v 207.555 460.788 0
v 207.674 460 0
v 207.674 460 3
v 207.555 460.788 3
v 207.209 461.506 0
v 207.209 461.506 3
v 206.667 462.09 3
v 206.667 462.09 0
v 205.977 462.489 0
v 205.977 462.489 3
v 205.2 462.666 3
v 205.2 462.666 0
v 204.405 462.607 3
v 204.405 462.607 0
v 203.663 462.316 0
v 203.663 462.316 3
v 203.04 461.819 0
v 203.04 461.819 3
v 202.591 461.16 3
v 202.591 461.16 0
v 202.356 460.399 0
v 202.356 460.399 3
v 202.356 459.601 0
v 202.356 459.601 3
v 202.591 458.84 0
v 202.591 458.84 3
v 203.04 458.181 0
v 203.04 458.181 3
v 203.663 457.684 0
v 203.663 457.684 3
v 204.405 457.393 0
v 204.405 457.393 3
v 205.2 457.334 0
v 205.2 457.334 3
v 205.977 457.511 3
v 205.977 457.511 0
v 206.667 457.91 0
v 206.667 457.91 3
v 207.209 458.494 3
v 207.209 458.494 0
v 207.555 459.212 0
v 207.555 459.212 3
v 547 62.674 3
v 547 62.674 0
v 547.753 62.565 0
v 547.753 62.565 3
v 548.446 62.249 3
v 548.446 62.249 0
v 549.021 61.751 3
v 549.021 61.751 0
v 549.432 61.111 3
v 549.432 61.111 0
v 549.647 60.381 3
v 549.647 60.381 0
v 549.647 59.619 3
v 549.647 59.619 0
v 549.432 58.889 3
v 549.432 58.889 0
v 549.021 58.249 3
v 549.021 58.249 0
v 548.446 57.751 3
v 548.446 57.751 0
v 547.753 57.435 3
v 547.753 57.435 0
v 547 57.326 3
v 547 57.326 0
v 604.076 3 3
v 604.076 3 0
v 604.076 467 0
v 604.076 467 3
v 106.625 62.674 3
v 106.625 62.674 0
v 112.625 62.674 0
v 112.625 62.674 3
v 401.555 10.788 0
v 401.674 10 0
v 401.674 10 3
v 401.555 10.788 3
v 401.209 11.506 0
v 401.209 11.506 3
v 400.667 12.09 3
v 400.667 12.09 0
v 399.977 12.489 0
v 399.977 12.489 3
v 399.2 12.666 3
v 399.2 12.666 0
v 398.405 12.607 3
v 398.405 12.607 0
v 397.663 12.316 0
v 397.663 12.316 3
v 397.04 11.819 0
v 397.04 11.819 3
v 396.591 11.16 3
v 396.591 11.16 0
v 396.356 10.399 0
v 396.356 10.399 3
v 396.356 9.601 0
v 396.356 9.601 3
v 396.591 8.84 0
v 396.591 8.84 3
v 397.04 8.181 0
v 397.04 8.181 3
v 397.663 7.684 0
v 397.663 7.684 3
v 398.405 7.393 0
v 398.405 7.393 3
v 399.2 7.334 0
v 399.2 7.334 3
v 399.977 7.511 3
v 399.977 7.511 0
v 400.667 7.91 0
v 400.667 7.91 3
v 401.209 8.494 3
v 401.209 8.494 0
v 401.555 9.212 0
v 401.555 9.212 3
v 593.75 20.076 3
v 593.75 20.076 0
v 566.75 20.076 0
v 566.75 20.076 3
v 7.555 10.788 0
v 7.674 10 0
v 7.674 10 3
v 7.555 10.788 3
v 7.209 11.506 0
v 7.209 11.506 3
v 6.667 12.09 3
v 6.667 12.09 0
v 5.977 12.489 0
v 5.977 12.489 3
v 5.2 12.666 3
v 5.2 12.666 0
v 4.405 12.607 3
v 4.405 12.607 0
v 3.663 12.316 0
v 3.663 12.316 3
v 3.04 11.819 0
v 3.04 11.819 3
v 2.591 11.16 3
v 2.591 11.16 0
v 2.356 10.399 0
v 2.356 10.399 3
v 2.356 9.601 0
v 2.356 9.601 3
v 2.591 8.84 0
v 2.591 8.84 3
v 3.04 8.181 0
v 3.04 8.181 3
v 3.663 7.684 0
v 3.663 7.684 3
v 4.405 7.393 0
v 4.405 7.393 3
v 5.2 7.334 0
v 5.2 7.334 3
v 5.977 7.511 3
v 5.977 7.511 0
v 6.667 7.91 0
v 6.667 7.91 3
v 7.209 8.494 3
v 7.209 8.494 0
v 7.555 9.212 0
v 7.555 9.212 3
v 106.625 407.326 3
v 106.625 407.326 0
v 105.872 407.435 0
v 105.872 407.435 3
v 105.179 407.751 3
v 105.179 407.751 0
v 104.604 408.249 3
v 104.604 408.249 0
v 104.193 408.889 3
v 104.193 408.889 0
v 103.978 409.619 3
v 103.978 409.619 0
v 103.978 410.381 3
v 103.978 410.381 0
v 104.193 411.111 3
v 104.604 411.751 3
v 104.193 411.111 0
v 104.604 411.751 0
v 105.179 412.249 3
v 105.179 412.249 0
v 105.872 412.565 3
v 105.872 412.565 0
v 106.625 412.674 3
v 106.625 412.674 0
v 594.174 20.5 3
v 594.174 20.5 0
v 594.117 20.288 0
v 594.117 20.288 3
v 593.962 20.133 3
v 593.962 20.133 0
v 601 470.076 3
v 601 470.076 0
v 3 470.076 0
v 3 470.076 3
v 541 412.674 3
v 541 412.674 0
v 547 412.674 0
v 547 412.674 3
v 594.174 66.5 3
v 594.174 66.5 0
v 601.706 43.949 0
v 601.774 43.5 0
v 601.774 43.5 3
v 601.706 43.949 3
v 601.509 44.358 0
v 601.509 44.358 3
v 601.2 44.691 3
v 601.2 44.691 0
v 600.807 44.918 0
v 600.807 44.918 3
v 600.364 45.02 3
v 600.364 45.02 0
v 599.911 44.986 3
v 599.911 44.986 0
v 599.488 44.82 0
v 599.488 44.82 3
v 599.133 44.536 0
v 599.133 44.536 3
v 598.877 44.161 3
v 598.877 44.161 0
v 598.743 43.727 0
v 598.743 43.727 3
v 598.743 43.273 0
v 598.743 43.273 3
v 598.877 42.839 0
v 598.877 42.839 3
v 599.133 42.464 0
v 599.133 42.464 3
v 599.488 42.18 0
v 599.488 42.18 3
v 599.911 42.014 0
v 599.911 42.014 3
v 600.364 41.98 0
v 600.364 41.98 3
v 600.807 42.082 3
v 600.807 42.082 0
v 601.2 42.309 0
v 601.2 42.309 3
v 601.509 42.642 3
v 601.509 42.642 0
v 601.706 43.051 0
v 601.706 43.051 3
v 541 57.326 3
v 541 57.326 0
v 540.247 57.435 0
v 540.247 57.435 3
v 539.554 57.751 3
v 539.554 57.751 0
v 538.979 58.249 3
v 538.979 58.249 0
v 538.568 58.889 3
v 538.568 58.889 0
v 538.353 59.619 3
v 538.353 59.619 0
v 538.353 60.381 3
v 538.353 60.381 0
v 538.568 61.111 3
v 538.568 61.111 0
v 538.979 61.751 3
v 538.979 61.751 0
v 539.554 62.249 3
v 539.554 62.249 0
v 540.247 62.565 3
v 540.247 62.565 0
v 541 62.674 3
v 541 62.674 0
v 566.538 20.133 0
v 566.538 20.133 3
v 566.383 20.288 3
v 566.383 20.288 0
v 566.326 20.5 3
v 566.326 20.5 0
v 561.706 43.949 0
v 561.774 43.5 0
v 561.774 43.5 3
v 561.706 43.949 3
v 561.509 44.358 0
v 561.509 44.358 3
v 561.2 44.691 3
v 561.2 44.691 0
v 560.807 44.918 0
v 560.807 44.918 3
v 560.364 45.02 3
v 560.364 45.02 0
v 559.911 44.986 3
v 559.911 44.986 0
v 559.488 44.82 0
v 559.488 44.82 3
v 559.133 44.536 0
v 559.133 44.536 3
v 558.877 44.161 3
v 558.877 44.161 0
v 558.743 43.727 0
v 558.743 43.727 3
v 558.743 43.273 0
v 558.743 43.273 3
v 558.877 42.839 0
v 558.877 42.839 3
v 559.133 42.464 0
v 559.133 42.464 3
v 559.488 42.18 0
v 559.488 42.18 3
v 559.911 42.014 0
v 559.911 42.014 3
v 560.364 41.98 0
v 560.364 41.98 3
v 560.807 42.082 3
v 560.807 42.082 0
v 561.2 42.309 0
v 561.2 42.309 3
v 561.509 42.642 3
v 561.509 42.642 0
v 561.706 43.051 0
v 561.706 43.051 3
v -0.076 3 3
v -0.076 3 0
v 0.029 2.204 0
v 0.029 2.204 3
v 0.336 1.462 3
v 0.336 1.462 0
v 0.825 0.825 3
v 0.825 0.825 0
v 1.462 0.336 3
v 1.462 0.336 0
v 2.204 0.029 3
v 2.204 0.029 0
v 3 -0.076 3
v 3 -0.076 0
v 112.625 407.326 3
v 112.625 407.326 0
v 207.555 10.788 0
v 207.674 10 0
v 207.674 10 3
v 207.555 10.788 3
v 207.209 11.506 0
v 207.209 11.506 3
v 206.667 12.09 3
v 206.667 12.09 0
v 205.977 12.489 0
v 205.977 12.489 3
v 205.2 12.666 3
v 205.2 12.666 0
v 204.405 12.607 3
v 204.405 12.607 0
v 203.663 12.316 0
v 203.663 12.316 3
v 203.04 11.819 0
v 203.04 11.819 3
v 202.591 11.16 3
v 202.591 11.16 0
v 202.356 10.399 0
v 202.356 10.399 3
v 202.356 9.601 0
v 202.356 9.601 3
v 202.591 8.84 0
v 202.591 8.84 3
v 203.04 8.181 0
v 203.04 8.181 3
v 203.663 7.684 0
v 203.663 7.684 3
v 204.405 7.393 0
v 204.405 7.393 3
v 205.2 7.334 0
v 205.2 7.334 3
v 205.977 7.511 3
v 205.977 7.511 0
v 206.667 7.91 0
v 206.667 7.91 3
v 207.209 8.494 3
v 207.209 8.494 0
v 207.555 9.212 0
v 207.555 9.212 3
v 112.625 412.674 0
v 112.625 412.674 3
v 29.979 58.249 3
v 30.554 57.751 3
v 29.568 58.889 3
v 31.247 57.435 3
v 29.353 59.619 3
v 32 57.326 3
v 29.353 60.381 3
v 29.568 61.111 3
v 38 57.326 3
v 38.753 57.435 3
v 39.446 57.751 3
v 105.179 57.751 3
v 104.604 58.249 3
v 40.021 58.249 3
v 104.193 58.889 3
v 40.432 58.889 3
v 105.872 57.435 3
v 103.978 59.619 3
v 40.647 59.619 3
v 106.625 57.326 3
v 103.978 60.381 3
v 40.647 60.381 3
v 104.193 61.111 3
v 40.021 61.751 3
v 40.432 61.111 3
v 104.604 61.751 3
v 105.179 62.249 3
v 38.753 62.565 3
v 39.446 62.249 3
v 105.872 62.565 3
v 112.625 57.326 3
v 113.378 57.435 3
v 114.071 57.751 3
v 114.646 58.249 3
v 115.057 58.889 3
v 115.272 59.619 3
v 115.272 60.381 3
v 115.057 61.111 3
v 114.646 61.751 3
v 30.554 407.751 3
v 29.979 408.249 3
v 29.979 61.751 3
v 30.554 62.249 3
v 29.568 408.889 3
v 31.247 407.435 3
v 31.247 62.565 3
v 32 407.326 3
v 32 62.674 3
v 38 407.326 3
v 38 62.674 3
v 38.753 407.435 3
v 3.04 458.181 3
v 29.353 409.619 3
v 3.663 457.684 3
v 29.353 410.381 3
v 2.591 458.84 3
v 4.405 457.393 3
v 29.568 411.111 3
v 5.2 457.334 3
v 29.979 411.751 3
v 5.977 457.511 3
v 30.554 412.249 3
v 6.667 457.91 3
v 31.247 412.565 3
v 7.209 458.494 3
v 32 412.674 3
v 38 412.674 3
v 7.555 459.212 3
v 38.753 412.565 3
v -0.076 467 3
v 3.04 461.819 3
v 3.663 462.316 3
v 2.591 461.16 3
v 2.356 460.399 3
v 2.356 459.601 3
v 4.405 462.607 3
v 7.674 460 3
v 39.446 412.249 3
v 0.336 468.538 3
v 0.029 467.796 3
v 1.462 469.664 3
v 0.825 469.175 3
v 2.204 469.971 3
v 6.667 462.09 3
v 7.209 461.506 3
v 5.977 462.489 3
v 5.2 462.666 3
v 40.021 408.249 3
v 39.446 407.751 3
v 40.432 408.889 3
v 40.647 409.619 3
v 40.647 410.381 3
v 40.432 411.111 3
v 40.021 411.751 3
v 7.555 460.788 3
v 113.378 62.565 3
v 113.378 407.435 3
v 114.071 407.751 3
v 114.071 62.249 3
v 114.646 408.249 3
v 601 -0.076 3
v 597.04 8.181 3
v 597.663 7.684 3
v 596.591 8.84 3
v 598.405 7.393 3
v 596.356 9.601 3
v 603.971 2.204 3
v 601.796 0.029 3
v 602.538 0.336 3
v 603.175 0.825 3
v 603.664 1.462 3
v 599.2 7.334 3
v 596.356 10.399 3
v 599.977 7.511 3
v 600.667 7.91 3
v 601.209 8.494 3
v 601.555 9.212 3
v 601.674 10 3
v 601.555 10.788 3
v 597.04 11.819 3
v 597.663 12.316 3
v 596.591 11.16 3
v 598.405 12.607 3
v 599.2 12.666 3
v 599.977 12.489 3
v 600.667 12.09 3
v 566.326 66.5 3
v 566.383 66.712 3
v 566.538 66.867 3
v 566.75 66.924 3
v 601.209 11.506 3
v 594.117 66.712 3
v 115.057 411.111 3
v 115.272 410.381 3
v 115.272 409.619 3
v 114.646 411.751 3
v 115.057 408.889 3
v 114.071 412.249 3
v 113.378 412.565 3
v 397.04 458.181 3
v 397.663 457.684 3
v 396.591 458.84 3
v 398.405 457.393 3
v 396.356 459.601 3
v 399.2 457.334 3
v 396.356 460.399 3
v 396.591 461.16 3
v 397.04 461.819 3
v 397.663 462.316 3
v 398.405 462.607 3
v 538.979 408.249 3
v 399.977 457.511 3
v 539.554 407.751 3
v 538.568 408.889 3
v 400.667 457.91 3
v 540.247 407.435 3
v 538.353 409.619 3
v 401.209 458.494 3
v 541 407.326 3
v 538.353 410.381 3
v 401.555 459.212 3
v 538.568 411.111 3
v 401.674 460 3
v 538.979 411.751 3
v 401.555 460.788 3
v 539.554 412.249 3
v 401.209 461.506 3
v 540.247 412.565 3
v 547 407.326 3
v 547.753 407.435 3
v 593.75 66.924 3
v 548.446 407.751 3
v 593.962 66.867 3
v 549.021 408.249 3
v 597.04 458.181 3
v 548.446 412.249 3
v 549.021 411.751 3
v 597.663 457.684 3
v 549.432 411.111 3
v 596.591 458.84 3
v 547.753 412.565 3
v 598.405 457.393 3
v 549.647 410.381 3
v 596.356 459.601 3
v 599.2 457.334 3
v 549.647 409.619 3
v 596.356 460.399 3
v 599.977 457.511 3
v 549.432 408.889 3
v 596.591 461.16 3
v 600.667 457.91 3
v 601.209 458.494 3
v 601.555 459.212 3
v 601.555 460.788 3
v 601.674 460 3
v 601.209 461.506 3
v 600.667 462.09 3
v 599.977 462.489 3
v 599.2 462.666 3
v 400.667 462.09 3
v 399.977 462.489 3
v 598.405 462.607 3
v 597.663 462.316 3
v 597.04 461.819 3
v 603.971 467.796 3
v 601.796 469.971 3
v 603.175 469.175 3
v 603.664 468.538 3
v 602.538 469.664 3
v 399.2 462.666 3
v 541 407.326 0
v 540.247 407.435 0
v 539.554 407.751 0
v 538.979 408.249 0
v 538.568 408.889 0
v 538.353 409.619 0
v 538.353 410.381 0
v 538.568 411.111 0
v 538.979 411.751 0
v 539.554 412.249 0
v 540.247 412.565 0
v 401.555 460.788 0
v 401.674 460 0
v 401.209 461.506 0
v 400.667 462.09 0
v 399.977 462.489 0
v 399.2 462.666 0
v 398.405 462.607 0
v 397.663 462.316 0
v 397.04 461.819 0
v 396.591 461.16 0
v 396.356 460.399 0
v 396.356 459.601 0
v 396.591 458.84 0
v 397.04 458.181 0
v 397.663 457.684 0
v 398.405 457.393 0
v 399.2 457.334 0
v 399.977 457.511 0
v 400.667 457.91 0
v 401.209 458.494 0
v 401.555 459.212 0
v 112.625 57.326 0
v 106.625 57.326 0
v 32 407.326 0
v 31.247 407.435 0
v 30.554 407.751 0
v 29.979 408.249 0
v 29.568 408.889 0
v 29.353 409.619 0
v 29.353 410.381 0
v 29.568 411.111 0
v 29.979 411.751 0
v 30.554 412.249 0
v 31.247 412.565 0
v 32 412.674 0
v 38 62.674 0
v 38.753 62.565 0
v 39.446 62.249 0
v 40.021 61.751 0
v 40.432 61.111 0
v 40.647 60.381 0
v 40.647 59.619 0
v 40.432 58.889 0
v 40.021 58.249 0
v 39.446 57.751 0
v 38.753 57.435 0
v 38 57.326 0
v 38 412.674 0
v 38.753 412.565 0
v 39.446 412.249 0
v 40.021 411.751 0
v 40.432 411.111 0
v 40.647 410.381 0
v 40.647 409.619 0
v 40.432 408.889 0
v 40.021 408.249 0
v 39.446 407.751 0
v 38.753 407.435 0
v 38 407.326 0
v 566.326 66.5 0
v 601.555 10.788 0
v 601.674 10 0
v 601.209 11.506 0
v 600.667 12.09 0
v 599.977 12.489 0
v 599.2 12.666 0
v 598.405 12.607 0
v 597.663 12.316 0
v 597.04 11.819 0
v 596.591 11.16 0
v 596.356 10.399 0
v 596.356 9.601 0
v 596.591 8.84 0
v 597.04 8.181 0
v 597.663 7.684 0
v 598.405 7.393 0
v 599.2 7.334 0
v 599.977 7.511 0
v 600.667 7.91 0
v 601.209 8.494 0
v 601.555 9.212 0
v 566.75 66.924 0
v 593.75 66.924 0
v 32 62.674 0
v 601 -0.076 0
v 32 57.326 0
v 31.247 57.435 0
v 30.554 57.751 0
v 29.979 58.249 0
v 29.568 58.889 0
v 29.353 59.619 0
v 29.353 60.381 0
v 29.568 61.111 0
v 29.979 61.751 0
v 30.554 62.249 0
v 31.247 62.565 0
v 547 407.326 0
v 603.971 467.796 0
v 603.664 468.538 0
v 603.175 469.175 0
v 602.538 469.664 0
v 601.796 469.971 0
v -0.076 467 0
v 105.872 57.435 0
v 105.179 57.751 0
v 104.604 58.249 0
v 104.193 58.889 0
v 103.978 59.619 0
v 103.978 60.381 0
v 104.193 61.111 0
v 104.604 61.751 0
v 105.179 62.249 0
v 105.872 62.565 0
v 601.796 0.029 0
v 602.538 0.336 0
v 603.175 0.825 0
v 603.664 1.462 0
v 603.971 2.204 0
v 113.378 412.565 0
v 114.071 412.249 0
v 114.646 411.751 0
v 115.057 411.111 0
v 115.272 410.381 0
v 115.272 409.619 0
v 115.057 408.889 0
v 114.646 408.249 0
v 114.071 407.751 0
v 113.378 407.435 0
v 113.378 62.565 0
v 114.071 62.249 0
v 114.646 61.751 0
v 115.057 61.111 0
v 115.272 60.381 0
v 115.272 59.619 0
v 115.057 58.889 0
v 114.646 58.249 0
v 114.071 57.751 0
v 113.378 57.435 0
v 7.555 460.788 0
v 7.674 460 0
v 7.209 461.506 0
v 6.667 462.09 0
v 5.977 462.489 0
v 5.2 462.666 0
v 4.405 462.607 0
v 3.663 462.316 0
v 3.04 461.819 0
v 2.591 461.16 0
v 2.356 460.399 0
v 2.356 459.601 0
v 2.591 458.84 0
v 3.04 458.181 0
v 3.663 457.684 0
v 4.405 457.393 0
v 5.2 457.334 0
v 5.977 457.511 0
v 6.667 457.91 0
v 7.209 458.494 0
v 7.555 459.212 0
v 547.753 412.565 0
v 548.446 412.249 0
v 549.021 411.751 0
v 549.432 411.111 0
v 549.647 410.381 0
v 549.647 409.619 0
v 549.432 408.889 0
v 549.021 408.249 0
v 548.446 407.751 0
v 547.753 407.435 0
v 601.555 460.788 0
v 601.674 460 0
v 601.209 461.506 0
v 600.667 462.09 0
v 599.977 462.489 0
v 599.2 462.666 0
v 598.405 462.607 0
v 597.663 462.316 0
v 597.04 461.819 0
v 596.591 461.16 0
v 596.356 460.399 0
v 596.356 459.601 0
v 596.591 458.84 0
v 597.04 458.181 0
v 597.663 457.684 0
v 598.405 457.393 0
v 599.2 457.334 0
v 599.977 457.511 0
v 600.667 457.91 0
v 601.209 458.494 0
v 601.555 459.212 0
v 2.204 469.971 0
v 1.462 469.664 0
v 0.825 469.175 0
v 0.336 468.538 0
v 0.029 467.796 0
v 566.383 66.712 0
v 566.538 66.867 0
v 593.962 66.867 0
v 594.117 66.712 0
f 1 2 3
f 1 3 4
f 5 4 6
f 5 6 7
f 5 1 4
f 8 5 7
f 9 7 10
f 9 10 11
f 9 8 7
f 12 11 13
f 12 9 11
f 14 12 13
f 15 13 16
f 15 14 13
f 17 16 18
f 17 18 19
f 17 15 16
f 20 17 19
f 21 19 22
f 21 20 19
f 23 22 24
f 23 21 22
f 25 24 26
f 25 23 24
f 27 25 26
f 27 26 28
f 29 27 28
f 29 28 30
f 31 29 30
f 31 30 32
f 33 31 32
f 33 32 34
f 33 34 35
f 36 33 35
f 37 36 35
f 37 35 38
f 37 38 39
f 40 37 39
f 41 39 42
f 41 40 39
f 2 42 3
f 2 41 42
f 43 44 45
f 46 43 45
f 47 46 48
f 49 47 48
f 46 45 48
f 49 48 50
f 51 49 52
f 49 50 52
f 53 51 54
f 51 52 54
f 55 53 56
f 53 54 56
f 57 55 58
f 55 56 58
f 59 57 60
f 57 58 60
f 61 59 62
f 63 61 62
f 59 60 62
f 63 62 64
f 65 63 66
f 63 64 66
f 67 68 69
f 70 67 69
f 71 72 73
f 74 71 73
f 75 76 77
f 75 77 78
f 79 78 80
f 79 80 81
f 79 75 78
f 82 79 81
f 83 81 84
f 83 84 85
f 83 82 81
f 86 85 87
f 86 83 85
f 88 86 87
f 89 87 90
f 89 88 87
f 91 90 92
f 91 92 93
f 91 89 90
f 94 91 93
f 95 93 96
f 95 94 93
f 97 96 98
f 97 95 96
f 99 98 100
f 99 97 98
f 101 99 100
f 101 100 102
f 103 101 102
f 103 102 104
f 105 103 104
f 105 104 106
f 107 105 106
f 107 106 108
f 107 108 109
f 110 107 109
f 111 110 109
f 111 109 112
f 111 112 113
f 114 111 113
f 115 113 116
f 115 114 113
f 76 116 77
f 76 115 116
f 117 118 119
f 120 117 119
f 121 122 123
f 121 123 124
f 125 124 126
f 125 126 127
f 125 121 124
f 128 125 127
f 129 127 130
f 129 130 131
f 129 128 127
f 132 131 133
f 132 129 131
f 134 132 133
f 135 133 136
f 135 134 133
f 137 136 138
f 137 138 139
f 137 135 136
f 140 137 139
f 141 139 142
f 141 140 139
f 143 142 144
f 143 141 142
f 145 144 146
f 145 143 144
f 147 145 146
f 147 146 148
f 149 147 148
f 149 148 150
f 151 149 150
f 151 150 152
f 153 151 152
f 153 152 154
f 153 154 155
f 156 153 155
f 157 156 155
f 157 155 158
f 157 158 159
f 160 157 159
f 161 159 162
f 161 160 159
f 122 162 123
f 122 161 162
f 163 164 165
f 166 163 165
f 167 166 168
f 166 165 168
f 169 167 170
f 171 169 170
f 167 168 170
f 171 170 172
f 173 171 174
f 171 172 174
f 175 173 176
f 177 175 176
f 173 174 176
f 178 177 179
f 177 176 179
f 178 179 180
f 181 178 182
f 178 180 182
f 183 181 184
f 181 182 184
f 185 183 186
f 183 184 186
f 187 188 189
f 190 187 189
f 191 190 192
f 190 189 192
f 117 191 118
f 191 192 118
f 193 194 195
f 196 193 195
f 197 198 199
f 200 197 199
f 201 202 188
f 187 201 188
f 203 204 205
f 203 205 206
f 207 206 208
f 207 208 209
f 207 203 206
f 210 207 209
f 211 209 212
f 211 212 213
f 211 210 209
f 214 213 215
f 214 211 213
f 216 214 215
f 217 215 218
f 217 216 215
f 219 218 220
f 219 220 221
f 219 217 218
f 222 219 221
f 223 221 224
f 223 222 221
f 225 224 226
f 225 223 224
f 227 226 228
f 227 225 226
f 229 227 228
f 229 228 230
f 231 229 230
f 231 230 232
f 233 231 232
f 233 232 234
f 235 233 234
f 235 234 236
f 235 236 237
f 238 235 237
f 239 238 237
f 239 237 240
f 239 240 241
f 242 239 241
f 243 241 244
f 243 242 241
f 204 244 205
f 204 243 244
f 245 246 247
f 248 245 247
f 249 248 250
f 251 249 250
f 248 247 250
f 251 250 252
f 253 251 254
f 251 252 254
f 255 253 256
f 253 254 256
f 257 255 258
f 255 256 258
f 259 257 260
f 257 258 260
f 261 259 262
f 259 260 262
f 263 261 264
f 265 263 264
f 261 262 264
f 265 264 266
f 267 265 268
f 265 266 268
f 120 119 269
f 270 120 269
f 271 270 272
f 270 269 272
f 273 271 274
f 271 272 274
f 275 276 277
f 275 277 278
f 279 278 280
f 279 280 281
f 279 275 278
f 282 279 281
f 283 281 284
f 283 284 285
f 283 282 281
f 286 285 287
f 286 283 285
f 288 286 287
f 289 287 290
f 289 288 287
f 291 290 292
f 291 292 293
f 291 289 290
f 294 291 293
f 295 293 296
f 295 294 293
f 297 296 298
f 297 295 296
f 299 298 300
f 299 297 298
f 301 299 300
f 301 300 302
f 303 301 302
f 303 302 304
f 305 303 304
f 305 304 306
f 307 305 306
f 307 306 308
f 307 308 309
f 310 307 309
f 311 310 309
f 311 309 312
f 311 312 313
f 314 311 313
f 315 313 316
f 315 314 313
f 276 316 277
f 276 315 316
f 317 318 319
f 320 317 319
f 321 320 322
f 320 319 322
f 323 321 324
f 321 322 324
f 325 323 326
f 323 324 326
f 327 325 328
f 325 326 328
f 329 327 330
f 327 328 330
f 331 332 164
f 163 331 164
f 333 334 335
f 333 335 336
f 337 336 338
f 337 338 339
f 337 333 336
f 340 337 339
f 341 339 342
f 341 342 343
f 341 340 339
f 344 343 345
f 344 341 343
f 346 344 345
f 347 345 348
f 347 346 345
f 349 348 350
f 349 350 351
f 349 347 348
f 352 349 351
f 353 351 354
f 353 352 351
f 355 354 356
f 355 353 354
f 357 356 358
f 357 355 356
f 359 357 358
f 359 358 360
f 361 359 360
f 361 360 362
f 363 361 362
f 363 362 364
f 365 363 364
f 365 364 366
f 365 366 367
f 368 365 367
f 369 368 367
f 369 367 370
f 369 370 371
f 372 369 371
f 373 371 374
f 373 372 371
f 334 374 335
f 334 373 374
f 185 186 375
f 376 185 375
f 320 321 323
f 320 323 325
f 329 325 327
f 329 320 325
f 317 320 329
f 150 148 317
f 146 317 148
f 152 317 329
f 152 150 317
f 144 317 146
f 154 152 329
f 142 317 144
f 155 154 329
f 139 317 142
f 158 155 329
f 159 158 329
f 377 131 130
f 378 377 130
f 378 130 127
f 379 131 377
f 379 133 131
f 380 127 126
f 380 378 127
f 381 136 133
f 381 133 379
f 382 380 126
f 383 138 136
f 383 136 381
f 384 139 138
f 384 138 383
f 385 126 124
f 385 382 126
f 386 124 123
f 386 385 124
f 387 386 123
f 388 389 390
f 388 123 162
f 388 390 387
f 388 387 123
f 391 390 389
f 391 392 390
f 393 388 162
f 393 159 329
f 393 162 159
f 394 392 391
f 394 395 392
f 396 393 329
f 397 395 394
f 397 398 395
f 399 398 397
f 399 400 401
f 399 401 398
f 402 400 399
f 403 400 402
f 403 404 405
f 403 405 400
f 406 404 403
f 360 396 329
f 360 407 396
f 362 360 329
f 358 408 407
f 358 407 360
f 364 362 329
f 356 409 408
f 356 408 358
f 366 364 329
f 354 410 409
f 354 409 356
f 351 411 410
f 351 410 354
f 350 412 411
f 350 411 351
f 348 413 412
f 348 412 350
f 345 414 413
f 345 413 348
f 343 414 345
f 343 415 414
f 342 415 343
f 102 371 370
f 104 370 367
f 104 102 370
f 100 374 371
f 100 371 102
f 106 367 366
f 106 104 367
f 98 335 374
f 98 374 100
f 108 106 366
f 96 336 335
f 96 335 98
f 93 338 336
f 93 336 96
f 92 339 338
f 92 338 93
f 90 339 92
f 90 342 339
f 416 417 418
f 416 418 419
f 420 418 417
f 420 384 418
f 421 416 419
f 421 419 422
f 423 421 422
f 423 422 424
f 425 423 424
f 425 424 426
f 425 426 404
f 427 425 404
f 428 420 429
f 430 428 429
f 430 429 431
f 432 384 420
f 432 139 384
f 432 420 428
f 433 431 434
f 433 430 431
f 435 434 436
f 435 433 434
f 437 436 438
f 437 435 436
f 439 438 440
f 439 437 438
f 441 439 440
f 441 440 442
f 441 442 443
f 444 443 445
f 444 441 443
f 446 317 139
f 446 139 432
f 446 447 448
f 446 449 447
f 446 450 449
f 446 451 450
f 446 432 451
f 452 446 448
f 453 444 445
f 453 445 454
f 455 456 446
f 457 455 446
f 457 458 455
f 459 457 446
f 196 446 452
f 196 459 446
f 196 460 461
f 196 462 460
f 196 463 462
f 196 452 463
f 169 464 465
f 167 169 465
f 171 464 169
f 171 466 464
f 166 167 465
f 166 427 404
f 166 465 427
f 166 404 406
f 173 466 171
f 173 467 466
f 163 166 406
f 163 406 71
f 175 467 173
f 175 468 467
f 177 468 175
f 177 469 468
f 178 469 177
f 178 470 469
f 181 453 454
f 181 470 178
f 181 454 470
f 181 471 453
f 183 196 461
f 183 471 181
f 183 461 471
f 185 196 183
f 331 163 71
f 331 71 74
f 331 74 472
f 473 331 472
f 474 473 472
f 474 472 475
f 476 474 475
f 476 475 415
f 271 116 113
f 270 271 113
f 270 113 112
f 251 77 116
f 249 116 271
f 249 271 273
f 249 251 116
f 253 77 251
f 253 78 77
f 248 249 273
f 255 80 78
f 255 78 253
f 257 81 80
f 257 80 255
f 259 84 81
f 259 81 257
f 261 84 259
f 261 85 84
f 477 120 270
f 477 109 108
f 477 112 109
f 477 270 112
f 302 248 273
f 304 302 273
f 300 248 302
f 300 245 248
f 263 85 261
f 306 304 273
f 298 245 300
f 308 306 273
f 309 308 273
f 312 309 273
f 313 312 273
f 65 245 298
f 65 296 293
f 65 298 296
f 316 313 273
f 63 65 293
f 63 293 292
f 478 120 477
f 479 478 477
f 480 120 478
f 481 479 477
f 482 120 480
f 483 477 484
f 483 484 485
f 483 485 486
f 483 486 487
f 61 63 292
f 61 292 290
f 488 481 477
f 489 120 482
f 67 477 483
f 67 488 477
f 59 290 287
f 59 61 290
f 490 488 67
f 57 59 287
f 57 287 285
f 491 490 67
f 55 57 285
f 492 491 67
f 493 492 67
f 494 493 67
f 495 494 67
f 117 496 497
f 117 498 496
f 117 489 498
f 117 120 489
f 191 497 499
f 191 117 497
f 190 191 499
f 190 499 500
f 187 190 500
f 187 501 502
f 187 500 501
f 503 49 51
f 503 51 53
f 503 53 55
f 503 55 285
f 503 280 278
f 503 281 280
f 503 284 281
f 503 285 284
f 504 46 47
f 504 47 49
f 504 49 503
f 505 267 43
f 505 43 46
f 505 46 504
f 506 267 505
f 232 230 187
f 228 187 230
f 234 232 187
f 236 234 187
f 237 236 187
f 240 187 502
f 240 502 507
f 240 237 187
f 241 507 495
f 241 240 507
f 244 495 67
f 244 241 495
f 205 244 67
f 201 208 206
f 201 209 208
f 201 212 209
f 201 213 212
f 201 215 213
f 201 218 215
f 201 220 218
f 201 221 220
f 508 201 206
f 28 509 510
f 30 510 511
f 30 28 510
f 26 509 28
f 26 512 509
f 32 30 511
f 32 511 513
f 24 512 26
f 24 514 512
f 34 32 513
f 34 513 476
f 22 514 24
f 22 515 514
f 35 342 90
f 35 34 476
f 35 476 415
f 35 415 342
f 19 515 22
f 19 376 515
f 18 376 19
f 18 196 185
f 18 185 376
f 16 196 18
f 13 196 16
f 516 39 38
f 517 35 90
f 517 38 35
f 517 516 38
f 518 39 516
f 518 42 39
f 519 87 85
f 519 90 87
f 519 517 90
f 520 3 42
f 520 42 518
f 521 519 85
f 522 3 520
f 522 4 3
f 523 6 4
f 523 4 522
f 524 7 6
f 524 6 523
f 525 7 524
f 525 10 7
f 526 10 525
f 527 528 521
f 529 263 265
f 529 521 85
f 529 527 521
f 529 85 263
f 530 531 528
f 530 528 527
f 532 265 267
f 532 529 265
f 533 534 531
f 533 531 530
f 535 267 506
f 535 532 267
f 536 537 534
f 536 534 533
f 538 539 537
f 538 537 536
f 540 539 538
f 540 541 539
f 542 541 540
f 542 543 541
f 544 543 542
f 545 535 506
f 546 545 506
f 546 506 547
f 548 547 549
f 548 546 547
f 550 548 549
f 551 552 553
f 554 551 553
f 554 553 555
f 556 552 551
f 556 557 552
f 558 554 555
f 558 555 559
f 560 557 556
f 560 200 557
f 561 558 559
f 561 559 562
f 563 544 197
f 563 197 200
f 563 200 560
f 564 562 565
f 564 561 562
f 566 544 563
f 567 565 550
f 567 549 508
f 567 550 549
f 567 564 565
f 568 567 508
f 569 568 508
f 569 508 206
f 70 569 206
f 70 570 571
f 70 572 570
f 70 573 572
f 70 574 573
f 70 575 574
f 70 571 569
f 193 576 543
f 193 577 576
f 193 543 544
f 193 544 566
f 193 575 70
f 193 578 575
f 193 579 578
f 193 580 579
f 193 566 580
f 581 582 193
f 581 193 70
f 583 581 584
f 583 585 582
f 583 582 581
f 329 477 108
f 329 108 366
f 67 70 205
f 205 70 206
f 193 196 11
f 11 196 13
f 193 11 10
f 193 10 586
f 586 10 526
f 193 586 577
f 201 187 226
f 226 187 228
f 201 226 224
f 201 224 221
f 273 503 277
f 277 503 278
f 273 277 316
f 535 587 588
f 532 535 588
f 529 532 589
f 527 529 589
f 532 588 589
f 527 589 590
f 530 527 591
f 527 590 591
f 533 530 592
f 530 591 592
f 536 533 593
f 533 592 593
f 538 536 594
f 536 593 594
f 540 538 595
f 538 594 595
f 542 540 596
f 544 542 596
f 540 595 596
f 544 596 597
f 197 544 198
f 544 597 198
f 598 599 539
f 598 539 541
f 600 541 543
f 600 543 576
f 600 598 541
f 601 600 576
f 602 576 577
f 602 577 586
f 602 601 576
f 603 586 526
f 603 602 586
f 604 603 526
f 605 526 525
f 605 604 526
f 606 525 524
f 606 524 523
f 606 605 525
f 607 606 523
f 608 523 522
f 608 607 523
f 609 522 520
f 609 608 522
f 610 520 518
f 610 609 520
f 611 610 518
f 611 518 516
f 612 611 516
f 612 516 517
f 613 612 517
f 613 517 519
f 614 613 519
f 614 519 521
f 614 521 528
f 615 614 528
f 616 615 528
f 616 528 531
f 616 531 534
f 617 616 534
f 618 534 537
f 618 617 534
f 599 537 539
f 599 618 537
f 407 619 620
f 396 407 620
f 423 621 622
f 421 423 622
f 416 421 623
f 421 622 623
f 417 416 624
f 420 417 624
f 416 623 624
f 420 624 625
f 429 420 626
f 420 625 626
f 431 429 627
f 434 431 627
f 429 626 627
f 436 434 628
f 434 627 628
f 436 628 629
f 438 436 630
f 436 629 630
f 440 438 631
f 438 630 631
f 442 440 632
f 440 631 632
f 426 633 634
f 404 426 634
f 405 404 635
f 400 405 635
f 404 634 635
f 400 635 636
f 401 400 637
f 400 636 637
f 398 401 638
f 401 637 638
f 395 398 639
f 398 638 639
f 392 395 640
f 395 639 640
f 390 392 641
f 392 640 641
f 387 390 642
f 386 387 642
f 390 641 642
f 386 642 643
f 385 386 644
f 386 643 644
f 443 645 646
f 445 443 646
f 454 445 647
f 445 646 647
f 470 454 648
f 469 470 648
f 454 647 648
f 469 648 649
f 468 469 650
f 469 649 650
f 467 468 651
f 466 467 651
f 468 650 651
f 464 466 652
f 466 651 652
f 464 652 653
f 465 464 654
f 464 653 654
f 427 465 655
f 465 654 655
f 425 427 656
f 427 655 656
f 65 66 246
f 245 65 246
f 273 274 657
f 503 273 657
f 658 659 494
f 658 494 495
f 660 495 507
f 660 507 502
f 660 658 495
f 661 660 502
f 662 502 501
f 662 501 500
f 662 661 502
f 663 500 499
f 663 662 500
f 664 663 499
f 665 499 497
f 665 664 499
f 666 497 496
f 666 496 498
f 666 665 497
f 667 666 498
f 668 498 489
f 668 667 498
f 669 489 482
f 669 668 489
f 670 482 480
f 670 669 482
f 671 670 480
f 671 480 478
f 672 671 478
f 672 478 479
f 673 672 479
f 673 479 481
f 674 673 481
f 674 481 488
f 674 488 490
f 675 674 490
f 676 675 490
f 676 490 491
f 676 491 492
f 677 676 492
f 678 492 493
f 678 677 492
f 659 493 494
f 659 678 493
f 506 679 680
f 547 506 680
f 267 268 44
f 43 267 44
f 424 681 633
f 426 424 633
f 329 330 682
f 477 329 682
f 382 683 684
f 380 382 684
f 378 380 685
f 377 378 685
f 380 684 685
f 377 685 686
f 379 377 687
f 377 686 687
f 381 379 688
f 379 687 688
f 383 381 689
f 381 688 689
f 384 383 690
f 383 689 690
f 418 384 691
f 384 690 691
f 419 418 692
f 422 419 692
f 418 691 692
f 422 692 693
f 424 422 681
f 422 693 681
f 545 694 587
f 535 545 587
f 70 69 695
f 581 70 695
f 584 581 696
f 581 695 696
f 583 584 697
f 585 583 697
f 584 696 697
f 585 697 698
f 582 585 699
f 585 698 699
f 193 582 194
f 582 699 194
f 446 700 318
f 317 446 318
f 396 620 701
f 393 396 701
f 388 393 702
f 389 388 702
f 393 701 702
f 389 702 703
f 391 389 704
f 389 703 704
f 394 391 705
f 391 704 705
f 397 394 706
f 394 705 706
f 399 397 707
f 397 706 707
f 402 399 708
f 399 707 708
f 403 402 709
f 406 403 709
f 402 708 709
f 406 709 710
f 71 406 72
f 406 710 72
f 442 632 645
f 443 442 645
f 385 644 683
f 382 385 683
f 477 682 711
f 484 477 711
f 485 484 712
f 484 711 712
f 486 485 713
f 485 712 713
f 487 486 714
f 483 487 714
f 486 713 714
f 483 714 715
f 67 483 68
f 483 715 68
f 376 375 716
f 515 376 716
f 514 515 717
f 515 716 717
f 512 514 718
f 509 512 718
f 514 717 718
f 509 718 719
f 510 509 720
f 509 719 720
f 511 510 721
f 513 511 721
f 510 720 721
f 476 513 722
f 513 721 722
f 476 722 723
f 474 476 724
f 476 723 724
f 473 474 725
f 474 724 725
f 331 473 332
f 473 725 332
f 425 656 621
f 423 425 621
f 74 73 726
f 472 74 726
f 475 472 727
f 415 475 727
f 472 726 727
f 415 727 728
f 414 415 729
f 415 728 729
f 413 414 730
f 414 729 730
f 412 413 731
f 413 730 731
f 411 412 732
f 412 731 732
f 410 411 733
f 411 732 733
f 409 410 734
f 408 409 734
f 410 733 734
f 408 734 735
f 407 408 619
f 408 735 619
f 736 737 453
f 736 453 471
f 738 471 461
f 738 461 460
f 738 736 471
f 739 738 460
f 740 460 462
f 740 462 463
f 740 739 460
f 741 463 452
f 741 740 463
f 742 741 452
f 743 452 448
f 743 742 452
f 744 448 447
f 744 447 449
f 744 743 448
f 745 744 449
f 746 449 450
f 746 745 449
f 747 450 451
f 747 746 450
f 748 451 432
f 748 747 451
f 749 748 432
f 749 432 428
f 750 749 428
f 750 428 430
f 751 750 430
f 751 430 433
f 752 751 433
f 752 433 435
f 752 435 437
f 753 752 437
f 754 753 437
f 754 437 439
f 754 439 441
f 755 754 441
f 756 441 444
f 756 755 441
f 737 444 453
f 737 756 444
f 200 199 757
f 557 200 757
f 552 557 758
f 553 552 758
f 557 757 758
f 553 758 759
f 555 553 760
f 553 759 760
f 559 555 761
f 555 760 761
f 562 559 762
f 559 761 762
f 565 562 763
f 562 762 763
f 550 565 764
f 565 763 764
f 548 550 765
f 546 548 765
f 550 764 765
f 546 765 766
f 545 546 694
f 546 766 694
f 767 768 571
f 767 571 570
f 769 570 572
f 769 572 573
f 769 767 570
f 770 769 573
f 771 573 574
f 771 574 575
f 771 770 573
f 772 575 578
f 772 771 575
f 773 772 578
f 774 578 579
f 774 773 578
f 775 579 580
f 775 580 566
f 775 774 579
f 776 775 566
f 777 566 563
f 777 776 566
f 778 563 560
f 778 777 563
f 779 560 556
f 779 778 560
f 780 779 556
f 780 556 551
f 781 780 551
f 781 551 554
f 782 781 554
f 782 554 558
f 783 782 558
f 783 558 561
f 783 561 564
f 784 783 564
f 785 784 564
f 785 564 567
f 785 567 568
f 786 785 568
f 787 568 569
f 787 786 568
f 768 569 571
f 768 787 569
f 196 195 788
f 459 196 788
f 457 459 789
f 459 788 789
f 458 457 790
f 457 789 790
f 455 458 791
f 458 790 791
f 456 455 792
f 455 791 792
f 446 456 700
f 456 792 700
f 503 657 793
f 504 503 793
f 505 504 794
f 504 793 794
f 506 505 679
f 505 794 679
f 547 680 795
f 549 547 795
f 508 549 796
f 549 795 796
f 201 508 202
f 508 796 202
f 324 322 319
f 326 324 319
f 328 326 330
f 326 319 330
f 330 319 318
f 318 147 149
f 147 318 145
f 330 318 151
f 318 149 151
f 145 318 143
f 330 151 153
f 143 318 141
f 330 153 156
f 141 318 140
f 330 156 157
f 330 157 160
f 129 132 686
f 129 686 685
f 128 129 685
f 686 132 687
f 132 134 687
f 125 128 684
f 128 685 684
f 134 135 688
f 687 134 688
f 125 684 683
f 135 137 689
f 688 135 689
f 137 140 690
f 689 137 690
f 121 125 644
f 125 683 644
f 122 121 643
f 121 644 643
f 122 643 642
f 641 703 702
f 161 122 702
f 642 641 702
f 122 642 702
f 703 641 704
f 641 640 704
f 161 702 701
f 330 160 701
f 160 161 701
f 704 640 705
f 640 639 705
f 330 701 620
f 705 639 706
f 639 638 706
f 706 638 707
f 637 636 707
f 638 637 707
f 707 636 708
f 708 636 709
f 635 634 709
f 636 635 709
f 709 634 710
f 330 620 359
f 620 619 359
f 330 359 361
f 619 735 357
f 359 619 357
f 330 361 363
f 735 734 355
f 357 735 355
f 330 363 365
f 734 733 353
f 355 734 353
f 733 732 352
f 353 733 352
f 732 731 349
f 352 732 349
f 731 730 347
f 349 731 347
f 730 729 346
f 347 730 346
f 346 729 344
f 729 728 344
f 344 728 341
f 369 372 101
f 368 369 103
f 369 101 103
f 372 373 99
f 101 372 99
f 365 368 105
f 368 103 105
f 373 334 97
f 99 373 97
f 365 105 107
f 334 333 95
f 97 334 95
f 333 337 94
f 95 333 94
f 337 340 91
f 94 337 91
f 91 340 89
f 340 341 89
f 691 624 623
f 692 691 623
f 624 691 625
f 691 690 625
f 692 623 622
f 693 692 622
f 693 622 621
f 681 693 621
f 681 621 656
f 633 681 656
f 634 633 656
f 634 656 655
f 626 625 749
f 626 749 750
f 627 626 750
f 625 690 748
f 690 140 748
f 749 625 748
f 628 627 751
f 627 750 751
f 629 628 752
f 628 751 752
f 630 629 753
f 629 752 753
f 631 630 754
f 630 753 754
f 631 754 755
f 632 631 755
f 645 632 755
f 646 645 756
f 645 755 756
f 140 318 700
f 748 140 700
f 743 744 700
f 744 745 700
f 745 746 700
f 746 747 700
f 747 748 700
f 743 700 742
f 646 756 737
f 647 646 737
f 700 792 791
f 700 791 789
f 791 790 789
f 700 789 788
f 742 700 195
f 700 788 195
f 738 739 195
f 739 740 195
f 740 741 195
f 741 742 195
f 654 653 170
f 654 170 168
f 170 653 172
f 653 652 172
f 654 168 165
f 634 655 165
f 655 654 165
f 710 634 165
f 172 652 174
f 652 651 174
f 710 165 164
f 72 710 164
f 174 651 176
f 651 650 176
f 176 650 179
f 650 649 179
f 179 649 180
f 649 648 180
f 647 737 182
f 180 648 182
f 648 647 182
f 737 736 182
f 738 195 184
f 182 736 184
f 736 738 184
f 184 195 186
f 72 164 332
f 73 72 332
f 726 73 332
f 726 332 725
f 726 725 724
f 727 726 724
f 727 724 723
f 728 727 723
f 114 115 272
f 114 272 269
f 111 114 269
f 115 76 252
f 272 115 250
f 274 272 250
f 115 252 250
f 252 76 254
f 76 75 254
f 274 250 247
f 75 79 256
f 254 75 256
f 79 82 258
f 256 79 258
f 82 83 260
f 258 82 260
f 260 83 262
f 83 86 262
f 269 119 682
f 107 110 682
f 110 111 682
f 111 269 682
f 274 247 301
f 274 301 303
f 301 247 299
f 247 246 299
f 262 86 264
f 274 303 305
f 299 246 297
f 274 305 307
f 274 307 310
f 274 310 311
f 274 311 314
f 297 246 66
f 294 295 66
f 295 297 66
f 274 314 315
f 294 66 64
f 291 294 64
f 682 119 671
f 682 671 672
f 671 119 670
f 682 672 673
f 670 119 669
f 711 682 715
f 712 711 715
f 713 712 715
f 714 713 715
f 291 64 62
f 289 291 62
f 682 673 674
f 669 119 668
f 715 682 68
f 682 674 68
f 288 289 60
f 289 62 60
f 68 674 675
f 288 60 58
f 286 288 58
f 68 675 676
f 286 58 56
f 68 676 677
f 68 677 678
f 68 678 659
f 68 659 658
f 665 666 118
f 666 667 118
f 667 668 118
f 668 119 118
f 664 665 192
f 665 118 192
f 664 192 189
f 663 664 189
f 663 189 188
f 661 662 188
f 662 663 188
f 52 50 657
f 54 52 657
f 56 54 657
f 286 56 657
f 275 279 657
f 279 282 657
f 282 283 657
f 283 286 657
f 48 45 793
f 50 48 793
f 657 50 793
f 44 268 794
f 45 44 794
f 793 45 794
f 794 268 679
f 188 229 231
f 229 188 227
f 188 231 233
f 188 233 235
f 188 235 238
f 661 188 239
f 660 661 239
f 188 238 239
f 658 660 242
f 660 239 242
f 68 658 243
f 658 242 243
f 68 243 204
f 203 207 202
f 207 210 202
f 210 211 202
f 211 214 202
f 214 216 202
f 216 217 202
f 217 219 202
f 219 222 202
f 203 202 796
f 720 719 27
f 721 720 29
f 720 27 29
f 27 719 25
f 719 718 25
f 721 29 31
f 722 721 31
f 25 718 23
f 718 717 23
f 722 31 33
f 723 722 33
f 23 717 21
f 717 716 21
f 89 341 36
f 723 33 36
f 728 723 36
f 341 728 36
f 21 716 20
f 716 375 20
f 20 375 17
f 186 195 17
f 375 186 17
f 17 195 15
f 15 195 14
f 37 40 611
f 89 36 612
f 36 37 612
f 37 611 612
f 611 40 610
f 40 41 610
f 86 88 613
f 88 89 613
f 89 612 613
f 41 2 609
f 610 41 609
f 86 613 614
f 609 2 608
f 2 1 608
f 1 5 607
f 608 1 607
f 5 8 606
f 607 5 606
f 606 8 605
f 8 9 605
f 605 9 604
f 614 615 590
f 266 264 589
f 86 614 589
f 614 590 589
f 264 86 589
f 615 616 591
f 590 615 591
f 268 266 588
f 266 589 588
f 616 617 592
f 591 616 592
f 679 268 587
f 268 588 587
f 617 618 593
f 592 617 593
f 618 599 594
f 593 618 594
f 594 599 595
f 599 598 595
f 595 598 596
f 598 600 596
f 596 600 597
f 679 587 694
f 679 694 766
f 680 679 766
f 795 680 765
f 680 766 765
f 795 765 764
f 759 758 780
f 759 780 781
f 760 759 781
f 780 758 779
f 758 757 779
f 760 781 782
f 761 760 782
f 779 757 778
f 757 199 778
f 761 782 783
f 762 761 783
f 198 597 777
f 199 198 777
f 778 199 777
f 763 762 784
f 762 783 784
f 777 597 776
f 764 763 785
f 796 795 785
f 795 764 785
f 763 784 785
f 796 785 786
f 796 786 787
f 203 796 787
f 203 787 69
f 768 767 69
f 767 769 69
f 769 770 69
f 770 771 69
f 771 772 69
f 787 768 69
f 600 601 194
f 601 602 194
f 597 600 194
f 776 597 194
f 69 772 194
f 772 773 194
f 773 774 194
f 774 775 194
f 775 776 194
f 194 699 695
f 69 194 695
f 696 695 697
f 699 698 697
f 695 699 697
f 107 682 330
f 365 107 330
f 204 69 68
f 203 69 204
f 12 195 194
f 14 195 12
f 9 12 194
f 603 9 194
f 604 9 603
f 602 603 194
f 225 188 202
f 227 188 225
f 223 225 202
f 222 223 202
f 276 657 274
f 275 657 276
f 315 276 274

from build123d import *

# Parameters (mm, degrees)
SKETCH1_W              = 604
SKETCH1_H              = 470
BOSS_EXTRUDE1_DEPTH    = 3
FILLET1_R              = 3
M5_CLEARANCE_HOLE1_D   = 5.5
SKETCH5_R              = 1.6
SKETCH5_W              = 28
SKETCH5_H              = 47
CUT_EXTRUDE1_DEPTH     = 766.326727614
FILLET2_R              = 0.5
CUT_EXTRUDE5_DEPTH     = 766.326727614
MOVE_FACE1_OUTLINE_R   = 2.75
MOVE_FACE1_OUTLINE_R_2 = 2.6738
MOVE_FACE1_OUTLINE_R_3 = 1.6
MOVE_FACE1_OUTLINE_R_4 = 1.5238
MOVE_FACE1_DEPTH       = 3


# Read off the part's stored shape, not the designer's step: Move Face1
with BuildPart() as part:
    # Sketch1 → Boss-Extrude1 (new body)
    with BuildSketch(Plane.XY):
        with Locations((302, 235)):
            Rectangle(SKETCH1_W, SKETCH1_H)
    extrude(amount=BOSS_EXTRUDE1_DEPTH)

    # Fillet1
    fillet1_edges = [part.edges().sort_by_distance(p)[0] for p in [
        (0, 470, 1.5),
        (604, 470, 1.5),
        (604, 0, 1.5),
        (0, 0, 1.5),
    ]]
    fillet(fillet1_edges, radius=FILLET1_R)

    # M5 Clearance Hole1 (through all)
    with Locations(Plane(origin=(0, 0, 0), x_dir=(-1, 0, 0), z_dir=(0, 0, -1))):
        with Locations((-599, 460), (-399, 460), (-205, 460), (-5, 460), (-5, 10), (-205, 10), (-399, 10), (-599, 10), (-544, 410), (-544, 60), (-35, 410), (-35, 60), (-109.625, 410), (-109.625, 60)):
            Hole(M5_CLEARANCE_HOLE1_D / 2)

    # Sketch5 → Cut-Extrude1 (cut, through all)
    with BuildSketch(Plane.XY.offset(3)):
        with Locations((560.25, 43.5)):
            Circle(SKETCH5_R)
        with Locations(Location((600.25, 43.5, 0), (0, 0, 180))):
            Circle(SKETCH5_R)
        with Locations((580.25, 43.5)):
            Rectangle(SKETCH5_W, SKETCH5_H)
    extrude(amount=-CUT_EXTRUDE1_DEPTH, mode=Mode.SUBTRACT)

    # Fillet2
    fillet2_edges = [part.edges().sort_by_distance(p)[0] for p in [
        (566.25, 20, 1.5),
        (566.25, 67, 1.5),
        (594.25, 67, 1.5),
        (594.25, 20, 1.5),
    ]]
    fillet(fillet2_edges, radius=FILLET2_R)

    # Sketch9 → Cut-Extrude5 (cut, through all)
    with BuildSketch(Plane.XY.offset(3)):
        with BuildLine():
            Line((32, 412.75), (38, 412.75))
            ThreePointArc((38, 412.75), (40.75, 410), (38, 407.25))
            Line((38, 407.25), (32, 407.25))
            ThreePointArc((32, 407.25), (29.25, 410), (32, 412.75))
        make_face()
        with BuildLine():
            Line((106.625, 412.75), (112.625, 412.75))
            ThreePointArc((112.625, 412.75), (115.375, 410), (112.625, 407.25))
            Line((112.625, 407.25), (106.625, 407.25))
            ThreePointArc((106.625, 407.25), (103.875, 410), (106.625, 412.75))
        make_face()
        with BuildLine():
            Line((32, 62.75), (38, 62.75))
            ThreePointArc((38, 62.75), (40.75, 60), (38, 57.25))
            Line((38, 57.25), (32, 57.25))
            ThreePointArc((32, 57.25), (29.25, 60), (32, 62.75))
        make_face()
        with BuildLine():
            Line((106.625, 62.75), (112.625, 62.75))
            ThreePointArc((112.625, 62.75), (115.375, 60), (112.625, 57.25))
            Line((112.625, 57.25), (106.625, 57.25))
            ThreePointArc((106.625, 57.25), (103.875, 60), (106.625, 62.75))
        make_face()
        with BuildLine():
            Line((541, 412.75), (547, 412.75))
            ThreePointArc((547, 412.75), (549.75, 410), (547, 407.25))
            Line((547, 407.25), (541, 407.25))
            ThreePointArc((541, 407.25), (538.25, 410), (541, 412.75))
        make_face()
        with BuildLine():
            Line((541, 62.75), (547, 62.75))
            ThreePointArc((547, 62.75), (549.75, 60), (547, 57.25))
            Line((547, 57.25), (541, 57.25))
            ThreePointArc((541, 57.25), (538.25, 60), (541, 62.75))
        make_face()
    extrude(amount=-CUT_EXTRUDE5_DEPTH, mode=Mode.SUBTRACT)

    # Move Face1 outline → Move Face1 (add)
    # profile 1 of 18: a face of its own
    with BuildSketch(Plane.XY):
        with BuildLine():
            Line((-0.0762, 467), (-0.0762, 3))
            ThreePointArc((-0.0762, 3), (0.82479812, 0.82479812), (3, -0.0762))
            Line((3, -0.0762), (601, -0.0762))
            ThreePointArc((601, -0.0762), (603.17520188, 0.82479812), (604.0762, 3))
            Line((604.0762, 3), (604.0762, 467))
            ThreePointArc((604.0762, 467), (603.17520188, 469.17520188), (601, 470.0762))
            Line((601, 470.0762), (3, 470.0762))
            ThreePointArc((3, 470.0762), (0.82479812, 469.17520188), (-0.0762, 467))
        make_face()
        with BuildLine():
            ThreePointArc((3, 0), (0.878679656, 0.878679656), (0, 3))
            Line((0, 3), (0, 467))
            ThreePointArc((0, 467), (0.878679656, 469.121320344), (3, 470))
            Line((3, 470), (601, 470))
            ThreePointArc((601, 470), (603.121320344, 469.121320344), (604, 467))
            Line((604, 467), (604, 3))
            ThreePointArc((604, 3), (603.121320344, 0.878679656), (601, 0))
            Line((601, 0), (3, 0))
        make_face(mode=Mode.SUBTRACT)
    # profile 2 of 18: a face of its own
    with BuildSketch(Plane.XY):
        with Locations((599, 10)):
            Circle(MOVE_FACE1_OUTLINE_R)
        with Locations((599, 10)):
            Circle(MOVE_FACE1_OUTLINE_R_2, mode=Mode.SUBTRACT)
    # profile 3 of 18: a face of its own
    with BuildSketch(Plane.XY):
        with Locations((399, 10)):
            Circle(MOVE_FACE1_OUTLINE_R)
        with Locations((399, 10)):
            Circle(MOVE_FACE1_OUTLINE_R_2, mode=Mode.SUBTRACT)
    # profile 4 of 18: a face of its own
    with BuildSketch(Plane.XY):
        with Locations((205, 10)):
            Circle(MOVE_FACE1_OUTLINE_R)
        with Locations((205, 10)):
            Circle(MOVE_FACE1_OUTLINE_R_2, mode=Mode.SUBTRACT)
    # profile 5 of 18: a face of its own
    with BuildSketch(Plane.XY):
        with Locations((5, 10)):
            Circle(MOVE_FACE1_OUTLINE_R)
        with Locations((5, 10)):
            Circle(MOVE_FACE1_OUTLINE_R_2, mode=Mode.SUBTRACT)
    # profile 6 of 18: a face of its own
    with BuildSketch(Plane.XY):
        with Locations((5, 460)):
            Circle(MOVE_FACE1_OUTLINE_R)
        with Locations((5, 460)):
            Circle(MOVE_FACE1_OUTLINE_R_2, mode=Mode.SUBTRACT)
    # profile 7 of 18: a face of its own
    with BuildSketch(Plane.XY):
        with Locations((205, 460)):
            Circle(MOVE_FACE1_OUTLINE_R)
        with Locations((205, 460)):
            Circle(MOVE_FACE1_OUTLINE_R_2, mode=Mode.SUBTRACT)
    # profile 8 of 18: a face of its own
    with BuildSketch(Plane.XY):
        with Locations((399, 460)):
            Circle(MOVE_FACE1_OUTLINE_R)
        with Locations((399, 460)):
            Circle(MOVE_FACE1_OUTLINE_R_2, mode=Mode.SUBTRACT)
    # profile 9 of 18: a face of its own
    with BuildSketch(Plane.XY):
        with Locations((599, 460)):
            Circle(MOVE_FACE1_OUTLINE_R)
        with Locations((599, 460)):
            Circle(MOVE_FACE1_OUTLINE_R_2, mode=Mode.SUBTRACT)
    # profile 10 of 18: a face of its own
    with BuildSketch(Plane.XY):
        with BuildLine():
            ThreePointArc((566.75, 67), (566.396446609, 66.853553391), (566.25, 66.5))
            Line((566.25, 66.5), (566.25, 20.5))
            ThreePointArc((566.25, 20.5), (566.396446609, 20.146446609), (566.75, 20))
            Line((566.75, 20), (593.75, 20))
            ThreePointArc((593.75, 20), (594.103553391, 20.146446609), (594.25, 20.5))
            Line((594.25, 20.5), (594.25, 66.5))
            ThreePointArc((594.25, 66.5), (594.103553391, 66.853553391), (593.75, 67))
            Line((593.75, 67), (566.75, 67))
        make_face()
        with BuildLine():
            Line((566.3262, 20.5), (566.3262, 66.5))
            ThreePointArc((566.3262, 66.5), (566.450328146, 66.799671854), (566.75, 66.9238))
            Line((566.75, 66.9238), (593.75, 66.9238))
            ThreePointArc((593.75, 66.9238), (594.049671854, 66.799671854), (594.1738, 66.5))
            Line((594.1738, 66.5), (594.1738, 20.5))
            ThreePointArc((594.1738, 20.5), (594.049671854, 20.200328146), (593.75, 20.0762))
            Line((593.75, 20.0762), (566.75, 20.0762))
            ThreePointArc((566.75, 20.0762), (566.450328146, 20.200328146), (566.3262, 20.5))
        make_face(mode=Mode.SUBTRACT)
    # profile 11 of 18: a face of its own
    with BuildSketch(Plane.XY):
        with Locations((560.25, 43.5)):
            Circle(MOVE_FACE1_OUTLINE_R_3)
        with Locations((560.25, 43.5)):
            Circle(MOVE_FACE1_OUTLINE_R_4, mode=Mode.SUBTRACT)
    # profile 12 of 18: a face of its own
    with BuildSketch(Plane.XY):
        with Locations((600.25, 43.5)):
            Circle(MOVE_FACE1_OUTLINE_R_3)
        with Locations((600.25, 43.5)):
            Circle(MOVE_FACE1_OUTLINE_R_4, mode=Mode.SUBTRACT)
    # profile 13 of 18: a face of its own
    with BuildSketch(Plane.XY):
        with BuildLine():
            ThreePointArc((38, 407.25), (40.75, 410), (38, 412.75))
            Line((38, 412.75), (32, 412.75))
            ThreePointArc((32, 412.75), (29.25, 410), (32, 407.25))
            Line((32, 407.25), (38, 407.25))
        make_face()
        with BuildLine():
            Line((32, 412.6738), (38, 412.6738))
            ThreePointArc((38, 412.6738), (40.6738, 410), (38, 407.3262))
            Line((38, 407.3262), (32, 407.3262))
            ThreePointArc((32, 407.3262), (29.3262, 410), (32, 412.6738))
        make_face(mode=Mode.SUBTRACT)
    # profile 14 of 18: a face of its own
    with BuildSketch(Plane.XY):
        with BuildLine():
            ThreePointArc((112.625, 407.25), (115.375, 410), (112.625, 412.75))
            Line((112.625, 412.75), (106.625, 412.75))
            ThreePointArc((106.625, 412.75), (103.875, 410), (106.625, 407.25))
            Line((106.625, 407.25), (112.625, 407.25))
        make_face()
        with BuildLine():
            Line((106.625, 412.6738), (112.625, 412.6738))
            ThreePointArc((112.625, 412.6738), (115.2988, 410), (112.625, 407.3262))
            Line((112.625, 407.3262), (106.625, 407.3262))
            ThreePointArc((106.625, 407.3262), (103.9512, 410), (106.625, 412.6738))
        make_face(mode=Mode.SUBTRACT)
    # profile 15 of 18: a face of its own
    with BuildSketch(Plane.XY):
        with BuildLine():
            ThreePointArc((547, 407.25), (549.75, 410), (547, 412.75))
            Line((547, 412.75), (541, 412.75))
            ThreePointArc((541, 412.75), (538.25, 410), (541, 407.25))
            Line((541, 407.25), (547, 407.25))
        make_face()
        with BuildLine():
            Line((541, 412.6738), (547, 412.6738))
            ThreePointArc((547, 412.6738), (549.6738, 410), (547, 407.3262))
            Line((547, 407.3262), (541, 407.3262))
            ThreePointArc((541, 407.3262), (538.3262, 410), (541, 412.6738))
        make_face(mode=Mode.SUBTRACT)
    # profile 16 of 18: a face of its own
    with BuildSketch(Plane.XY):
        with BuildLine():
            ThreePointArc((547, 57.25), (549.75, 60), (547, 62.75))
            Line((547, 62.75), (541, 62.75))
            ThreePointArc((541, 62.75), (538.25, 60), (541, 57.25))
            Line((541, 57.25), (547, 57.25))
        make_face()
        with BuildLine():
            Line((541, 62.6738), (547, 62.6738))
            ThreePointArc((547, 62.6738), (549.6738, 60), (547, 57.3262))
            Line((547, 57.3262), (541, 57.3262))
            ThreePointArc((541, 57.3262), (538.3262, 60), (541, 62.6738))
        make_face(mode=Mode.SUBTRACT)
    # profile 17 of 18: a face of its own
    with BuildSketch(Plane.XY):
        with BuildLine():
            ThreePointArc((38, 57.25), (40.75, 60), (38, 62.75))
            Line((38, 62.75), (32, 62.75))
            ThreePointArc((32, 62.75), (29.25, 60), (32, 57.25))
            Line((32, 57.25), (38, 57.25))
        make_face()
        with BuildLine():
            Line((32, 62.6738), (38, 62.6738))
            ThreePointArc((38, 62.6738), (40.6738, 60), (38, 57.3262))
            Line((38, 57.3262), (32, 57.3262))
            ThreePointArc((32, 57.3262), (29.3262, 60), (32, 62.6738))
        make_face(mode=Mode.SUBTRACT)
    # profile 18 of 18: a face of its own
    with BuildSketch(Plane.XY):
        with BuildLine():
            ThreePointArc((112.625, 57.25), (115.375, 60), (112.625, 62.75))
            Line((112.625, 62.75), (106.625, 62.75))
            ThreePointArc((106.625, 62.75), (103.875, 60), (106.625, 57.25))
            Line((106.625, 57.25), (112.625, 57.25))
        make_face()
        with BuildLine():
            Line((106.625, 62.6738), (112.625, 62.6738))
            ThreePointArc((112.625, 62.6738), (115.2988, 60), (112.625, 57.3262))
            Line((112.625, 57.3262), (106.625, 57.3262))
            ThreePointArc((106.625, 57.3262), (103.9512, 60), (106.625, 62.6738))
        make_face(mode=Mode.SUBTRACT)
    extrude(amount=MOVE_FACE1_DEPTH)


solid = part.part
